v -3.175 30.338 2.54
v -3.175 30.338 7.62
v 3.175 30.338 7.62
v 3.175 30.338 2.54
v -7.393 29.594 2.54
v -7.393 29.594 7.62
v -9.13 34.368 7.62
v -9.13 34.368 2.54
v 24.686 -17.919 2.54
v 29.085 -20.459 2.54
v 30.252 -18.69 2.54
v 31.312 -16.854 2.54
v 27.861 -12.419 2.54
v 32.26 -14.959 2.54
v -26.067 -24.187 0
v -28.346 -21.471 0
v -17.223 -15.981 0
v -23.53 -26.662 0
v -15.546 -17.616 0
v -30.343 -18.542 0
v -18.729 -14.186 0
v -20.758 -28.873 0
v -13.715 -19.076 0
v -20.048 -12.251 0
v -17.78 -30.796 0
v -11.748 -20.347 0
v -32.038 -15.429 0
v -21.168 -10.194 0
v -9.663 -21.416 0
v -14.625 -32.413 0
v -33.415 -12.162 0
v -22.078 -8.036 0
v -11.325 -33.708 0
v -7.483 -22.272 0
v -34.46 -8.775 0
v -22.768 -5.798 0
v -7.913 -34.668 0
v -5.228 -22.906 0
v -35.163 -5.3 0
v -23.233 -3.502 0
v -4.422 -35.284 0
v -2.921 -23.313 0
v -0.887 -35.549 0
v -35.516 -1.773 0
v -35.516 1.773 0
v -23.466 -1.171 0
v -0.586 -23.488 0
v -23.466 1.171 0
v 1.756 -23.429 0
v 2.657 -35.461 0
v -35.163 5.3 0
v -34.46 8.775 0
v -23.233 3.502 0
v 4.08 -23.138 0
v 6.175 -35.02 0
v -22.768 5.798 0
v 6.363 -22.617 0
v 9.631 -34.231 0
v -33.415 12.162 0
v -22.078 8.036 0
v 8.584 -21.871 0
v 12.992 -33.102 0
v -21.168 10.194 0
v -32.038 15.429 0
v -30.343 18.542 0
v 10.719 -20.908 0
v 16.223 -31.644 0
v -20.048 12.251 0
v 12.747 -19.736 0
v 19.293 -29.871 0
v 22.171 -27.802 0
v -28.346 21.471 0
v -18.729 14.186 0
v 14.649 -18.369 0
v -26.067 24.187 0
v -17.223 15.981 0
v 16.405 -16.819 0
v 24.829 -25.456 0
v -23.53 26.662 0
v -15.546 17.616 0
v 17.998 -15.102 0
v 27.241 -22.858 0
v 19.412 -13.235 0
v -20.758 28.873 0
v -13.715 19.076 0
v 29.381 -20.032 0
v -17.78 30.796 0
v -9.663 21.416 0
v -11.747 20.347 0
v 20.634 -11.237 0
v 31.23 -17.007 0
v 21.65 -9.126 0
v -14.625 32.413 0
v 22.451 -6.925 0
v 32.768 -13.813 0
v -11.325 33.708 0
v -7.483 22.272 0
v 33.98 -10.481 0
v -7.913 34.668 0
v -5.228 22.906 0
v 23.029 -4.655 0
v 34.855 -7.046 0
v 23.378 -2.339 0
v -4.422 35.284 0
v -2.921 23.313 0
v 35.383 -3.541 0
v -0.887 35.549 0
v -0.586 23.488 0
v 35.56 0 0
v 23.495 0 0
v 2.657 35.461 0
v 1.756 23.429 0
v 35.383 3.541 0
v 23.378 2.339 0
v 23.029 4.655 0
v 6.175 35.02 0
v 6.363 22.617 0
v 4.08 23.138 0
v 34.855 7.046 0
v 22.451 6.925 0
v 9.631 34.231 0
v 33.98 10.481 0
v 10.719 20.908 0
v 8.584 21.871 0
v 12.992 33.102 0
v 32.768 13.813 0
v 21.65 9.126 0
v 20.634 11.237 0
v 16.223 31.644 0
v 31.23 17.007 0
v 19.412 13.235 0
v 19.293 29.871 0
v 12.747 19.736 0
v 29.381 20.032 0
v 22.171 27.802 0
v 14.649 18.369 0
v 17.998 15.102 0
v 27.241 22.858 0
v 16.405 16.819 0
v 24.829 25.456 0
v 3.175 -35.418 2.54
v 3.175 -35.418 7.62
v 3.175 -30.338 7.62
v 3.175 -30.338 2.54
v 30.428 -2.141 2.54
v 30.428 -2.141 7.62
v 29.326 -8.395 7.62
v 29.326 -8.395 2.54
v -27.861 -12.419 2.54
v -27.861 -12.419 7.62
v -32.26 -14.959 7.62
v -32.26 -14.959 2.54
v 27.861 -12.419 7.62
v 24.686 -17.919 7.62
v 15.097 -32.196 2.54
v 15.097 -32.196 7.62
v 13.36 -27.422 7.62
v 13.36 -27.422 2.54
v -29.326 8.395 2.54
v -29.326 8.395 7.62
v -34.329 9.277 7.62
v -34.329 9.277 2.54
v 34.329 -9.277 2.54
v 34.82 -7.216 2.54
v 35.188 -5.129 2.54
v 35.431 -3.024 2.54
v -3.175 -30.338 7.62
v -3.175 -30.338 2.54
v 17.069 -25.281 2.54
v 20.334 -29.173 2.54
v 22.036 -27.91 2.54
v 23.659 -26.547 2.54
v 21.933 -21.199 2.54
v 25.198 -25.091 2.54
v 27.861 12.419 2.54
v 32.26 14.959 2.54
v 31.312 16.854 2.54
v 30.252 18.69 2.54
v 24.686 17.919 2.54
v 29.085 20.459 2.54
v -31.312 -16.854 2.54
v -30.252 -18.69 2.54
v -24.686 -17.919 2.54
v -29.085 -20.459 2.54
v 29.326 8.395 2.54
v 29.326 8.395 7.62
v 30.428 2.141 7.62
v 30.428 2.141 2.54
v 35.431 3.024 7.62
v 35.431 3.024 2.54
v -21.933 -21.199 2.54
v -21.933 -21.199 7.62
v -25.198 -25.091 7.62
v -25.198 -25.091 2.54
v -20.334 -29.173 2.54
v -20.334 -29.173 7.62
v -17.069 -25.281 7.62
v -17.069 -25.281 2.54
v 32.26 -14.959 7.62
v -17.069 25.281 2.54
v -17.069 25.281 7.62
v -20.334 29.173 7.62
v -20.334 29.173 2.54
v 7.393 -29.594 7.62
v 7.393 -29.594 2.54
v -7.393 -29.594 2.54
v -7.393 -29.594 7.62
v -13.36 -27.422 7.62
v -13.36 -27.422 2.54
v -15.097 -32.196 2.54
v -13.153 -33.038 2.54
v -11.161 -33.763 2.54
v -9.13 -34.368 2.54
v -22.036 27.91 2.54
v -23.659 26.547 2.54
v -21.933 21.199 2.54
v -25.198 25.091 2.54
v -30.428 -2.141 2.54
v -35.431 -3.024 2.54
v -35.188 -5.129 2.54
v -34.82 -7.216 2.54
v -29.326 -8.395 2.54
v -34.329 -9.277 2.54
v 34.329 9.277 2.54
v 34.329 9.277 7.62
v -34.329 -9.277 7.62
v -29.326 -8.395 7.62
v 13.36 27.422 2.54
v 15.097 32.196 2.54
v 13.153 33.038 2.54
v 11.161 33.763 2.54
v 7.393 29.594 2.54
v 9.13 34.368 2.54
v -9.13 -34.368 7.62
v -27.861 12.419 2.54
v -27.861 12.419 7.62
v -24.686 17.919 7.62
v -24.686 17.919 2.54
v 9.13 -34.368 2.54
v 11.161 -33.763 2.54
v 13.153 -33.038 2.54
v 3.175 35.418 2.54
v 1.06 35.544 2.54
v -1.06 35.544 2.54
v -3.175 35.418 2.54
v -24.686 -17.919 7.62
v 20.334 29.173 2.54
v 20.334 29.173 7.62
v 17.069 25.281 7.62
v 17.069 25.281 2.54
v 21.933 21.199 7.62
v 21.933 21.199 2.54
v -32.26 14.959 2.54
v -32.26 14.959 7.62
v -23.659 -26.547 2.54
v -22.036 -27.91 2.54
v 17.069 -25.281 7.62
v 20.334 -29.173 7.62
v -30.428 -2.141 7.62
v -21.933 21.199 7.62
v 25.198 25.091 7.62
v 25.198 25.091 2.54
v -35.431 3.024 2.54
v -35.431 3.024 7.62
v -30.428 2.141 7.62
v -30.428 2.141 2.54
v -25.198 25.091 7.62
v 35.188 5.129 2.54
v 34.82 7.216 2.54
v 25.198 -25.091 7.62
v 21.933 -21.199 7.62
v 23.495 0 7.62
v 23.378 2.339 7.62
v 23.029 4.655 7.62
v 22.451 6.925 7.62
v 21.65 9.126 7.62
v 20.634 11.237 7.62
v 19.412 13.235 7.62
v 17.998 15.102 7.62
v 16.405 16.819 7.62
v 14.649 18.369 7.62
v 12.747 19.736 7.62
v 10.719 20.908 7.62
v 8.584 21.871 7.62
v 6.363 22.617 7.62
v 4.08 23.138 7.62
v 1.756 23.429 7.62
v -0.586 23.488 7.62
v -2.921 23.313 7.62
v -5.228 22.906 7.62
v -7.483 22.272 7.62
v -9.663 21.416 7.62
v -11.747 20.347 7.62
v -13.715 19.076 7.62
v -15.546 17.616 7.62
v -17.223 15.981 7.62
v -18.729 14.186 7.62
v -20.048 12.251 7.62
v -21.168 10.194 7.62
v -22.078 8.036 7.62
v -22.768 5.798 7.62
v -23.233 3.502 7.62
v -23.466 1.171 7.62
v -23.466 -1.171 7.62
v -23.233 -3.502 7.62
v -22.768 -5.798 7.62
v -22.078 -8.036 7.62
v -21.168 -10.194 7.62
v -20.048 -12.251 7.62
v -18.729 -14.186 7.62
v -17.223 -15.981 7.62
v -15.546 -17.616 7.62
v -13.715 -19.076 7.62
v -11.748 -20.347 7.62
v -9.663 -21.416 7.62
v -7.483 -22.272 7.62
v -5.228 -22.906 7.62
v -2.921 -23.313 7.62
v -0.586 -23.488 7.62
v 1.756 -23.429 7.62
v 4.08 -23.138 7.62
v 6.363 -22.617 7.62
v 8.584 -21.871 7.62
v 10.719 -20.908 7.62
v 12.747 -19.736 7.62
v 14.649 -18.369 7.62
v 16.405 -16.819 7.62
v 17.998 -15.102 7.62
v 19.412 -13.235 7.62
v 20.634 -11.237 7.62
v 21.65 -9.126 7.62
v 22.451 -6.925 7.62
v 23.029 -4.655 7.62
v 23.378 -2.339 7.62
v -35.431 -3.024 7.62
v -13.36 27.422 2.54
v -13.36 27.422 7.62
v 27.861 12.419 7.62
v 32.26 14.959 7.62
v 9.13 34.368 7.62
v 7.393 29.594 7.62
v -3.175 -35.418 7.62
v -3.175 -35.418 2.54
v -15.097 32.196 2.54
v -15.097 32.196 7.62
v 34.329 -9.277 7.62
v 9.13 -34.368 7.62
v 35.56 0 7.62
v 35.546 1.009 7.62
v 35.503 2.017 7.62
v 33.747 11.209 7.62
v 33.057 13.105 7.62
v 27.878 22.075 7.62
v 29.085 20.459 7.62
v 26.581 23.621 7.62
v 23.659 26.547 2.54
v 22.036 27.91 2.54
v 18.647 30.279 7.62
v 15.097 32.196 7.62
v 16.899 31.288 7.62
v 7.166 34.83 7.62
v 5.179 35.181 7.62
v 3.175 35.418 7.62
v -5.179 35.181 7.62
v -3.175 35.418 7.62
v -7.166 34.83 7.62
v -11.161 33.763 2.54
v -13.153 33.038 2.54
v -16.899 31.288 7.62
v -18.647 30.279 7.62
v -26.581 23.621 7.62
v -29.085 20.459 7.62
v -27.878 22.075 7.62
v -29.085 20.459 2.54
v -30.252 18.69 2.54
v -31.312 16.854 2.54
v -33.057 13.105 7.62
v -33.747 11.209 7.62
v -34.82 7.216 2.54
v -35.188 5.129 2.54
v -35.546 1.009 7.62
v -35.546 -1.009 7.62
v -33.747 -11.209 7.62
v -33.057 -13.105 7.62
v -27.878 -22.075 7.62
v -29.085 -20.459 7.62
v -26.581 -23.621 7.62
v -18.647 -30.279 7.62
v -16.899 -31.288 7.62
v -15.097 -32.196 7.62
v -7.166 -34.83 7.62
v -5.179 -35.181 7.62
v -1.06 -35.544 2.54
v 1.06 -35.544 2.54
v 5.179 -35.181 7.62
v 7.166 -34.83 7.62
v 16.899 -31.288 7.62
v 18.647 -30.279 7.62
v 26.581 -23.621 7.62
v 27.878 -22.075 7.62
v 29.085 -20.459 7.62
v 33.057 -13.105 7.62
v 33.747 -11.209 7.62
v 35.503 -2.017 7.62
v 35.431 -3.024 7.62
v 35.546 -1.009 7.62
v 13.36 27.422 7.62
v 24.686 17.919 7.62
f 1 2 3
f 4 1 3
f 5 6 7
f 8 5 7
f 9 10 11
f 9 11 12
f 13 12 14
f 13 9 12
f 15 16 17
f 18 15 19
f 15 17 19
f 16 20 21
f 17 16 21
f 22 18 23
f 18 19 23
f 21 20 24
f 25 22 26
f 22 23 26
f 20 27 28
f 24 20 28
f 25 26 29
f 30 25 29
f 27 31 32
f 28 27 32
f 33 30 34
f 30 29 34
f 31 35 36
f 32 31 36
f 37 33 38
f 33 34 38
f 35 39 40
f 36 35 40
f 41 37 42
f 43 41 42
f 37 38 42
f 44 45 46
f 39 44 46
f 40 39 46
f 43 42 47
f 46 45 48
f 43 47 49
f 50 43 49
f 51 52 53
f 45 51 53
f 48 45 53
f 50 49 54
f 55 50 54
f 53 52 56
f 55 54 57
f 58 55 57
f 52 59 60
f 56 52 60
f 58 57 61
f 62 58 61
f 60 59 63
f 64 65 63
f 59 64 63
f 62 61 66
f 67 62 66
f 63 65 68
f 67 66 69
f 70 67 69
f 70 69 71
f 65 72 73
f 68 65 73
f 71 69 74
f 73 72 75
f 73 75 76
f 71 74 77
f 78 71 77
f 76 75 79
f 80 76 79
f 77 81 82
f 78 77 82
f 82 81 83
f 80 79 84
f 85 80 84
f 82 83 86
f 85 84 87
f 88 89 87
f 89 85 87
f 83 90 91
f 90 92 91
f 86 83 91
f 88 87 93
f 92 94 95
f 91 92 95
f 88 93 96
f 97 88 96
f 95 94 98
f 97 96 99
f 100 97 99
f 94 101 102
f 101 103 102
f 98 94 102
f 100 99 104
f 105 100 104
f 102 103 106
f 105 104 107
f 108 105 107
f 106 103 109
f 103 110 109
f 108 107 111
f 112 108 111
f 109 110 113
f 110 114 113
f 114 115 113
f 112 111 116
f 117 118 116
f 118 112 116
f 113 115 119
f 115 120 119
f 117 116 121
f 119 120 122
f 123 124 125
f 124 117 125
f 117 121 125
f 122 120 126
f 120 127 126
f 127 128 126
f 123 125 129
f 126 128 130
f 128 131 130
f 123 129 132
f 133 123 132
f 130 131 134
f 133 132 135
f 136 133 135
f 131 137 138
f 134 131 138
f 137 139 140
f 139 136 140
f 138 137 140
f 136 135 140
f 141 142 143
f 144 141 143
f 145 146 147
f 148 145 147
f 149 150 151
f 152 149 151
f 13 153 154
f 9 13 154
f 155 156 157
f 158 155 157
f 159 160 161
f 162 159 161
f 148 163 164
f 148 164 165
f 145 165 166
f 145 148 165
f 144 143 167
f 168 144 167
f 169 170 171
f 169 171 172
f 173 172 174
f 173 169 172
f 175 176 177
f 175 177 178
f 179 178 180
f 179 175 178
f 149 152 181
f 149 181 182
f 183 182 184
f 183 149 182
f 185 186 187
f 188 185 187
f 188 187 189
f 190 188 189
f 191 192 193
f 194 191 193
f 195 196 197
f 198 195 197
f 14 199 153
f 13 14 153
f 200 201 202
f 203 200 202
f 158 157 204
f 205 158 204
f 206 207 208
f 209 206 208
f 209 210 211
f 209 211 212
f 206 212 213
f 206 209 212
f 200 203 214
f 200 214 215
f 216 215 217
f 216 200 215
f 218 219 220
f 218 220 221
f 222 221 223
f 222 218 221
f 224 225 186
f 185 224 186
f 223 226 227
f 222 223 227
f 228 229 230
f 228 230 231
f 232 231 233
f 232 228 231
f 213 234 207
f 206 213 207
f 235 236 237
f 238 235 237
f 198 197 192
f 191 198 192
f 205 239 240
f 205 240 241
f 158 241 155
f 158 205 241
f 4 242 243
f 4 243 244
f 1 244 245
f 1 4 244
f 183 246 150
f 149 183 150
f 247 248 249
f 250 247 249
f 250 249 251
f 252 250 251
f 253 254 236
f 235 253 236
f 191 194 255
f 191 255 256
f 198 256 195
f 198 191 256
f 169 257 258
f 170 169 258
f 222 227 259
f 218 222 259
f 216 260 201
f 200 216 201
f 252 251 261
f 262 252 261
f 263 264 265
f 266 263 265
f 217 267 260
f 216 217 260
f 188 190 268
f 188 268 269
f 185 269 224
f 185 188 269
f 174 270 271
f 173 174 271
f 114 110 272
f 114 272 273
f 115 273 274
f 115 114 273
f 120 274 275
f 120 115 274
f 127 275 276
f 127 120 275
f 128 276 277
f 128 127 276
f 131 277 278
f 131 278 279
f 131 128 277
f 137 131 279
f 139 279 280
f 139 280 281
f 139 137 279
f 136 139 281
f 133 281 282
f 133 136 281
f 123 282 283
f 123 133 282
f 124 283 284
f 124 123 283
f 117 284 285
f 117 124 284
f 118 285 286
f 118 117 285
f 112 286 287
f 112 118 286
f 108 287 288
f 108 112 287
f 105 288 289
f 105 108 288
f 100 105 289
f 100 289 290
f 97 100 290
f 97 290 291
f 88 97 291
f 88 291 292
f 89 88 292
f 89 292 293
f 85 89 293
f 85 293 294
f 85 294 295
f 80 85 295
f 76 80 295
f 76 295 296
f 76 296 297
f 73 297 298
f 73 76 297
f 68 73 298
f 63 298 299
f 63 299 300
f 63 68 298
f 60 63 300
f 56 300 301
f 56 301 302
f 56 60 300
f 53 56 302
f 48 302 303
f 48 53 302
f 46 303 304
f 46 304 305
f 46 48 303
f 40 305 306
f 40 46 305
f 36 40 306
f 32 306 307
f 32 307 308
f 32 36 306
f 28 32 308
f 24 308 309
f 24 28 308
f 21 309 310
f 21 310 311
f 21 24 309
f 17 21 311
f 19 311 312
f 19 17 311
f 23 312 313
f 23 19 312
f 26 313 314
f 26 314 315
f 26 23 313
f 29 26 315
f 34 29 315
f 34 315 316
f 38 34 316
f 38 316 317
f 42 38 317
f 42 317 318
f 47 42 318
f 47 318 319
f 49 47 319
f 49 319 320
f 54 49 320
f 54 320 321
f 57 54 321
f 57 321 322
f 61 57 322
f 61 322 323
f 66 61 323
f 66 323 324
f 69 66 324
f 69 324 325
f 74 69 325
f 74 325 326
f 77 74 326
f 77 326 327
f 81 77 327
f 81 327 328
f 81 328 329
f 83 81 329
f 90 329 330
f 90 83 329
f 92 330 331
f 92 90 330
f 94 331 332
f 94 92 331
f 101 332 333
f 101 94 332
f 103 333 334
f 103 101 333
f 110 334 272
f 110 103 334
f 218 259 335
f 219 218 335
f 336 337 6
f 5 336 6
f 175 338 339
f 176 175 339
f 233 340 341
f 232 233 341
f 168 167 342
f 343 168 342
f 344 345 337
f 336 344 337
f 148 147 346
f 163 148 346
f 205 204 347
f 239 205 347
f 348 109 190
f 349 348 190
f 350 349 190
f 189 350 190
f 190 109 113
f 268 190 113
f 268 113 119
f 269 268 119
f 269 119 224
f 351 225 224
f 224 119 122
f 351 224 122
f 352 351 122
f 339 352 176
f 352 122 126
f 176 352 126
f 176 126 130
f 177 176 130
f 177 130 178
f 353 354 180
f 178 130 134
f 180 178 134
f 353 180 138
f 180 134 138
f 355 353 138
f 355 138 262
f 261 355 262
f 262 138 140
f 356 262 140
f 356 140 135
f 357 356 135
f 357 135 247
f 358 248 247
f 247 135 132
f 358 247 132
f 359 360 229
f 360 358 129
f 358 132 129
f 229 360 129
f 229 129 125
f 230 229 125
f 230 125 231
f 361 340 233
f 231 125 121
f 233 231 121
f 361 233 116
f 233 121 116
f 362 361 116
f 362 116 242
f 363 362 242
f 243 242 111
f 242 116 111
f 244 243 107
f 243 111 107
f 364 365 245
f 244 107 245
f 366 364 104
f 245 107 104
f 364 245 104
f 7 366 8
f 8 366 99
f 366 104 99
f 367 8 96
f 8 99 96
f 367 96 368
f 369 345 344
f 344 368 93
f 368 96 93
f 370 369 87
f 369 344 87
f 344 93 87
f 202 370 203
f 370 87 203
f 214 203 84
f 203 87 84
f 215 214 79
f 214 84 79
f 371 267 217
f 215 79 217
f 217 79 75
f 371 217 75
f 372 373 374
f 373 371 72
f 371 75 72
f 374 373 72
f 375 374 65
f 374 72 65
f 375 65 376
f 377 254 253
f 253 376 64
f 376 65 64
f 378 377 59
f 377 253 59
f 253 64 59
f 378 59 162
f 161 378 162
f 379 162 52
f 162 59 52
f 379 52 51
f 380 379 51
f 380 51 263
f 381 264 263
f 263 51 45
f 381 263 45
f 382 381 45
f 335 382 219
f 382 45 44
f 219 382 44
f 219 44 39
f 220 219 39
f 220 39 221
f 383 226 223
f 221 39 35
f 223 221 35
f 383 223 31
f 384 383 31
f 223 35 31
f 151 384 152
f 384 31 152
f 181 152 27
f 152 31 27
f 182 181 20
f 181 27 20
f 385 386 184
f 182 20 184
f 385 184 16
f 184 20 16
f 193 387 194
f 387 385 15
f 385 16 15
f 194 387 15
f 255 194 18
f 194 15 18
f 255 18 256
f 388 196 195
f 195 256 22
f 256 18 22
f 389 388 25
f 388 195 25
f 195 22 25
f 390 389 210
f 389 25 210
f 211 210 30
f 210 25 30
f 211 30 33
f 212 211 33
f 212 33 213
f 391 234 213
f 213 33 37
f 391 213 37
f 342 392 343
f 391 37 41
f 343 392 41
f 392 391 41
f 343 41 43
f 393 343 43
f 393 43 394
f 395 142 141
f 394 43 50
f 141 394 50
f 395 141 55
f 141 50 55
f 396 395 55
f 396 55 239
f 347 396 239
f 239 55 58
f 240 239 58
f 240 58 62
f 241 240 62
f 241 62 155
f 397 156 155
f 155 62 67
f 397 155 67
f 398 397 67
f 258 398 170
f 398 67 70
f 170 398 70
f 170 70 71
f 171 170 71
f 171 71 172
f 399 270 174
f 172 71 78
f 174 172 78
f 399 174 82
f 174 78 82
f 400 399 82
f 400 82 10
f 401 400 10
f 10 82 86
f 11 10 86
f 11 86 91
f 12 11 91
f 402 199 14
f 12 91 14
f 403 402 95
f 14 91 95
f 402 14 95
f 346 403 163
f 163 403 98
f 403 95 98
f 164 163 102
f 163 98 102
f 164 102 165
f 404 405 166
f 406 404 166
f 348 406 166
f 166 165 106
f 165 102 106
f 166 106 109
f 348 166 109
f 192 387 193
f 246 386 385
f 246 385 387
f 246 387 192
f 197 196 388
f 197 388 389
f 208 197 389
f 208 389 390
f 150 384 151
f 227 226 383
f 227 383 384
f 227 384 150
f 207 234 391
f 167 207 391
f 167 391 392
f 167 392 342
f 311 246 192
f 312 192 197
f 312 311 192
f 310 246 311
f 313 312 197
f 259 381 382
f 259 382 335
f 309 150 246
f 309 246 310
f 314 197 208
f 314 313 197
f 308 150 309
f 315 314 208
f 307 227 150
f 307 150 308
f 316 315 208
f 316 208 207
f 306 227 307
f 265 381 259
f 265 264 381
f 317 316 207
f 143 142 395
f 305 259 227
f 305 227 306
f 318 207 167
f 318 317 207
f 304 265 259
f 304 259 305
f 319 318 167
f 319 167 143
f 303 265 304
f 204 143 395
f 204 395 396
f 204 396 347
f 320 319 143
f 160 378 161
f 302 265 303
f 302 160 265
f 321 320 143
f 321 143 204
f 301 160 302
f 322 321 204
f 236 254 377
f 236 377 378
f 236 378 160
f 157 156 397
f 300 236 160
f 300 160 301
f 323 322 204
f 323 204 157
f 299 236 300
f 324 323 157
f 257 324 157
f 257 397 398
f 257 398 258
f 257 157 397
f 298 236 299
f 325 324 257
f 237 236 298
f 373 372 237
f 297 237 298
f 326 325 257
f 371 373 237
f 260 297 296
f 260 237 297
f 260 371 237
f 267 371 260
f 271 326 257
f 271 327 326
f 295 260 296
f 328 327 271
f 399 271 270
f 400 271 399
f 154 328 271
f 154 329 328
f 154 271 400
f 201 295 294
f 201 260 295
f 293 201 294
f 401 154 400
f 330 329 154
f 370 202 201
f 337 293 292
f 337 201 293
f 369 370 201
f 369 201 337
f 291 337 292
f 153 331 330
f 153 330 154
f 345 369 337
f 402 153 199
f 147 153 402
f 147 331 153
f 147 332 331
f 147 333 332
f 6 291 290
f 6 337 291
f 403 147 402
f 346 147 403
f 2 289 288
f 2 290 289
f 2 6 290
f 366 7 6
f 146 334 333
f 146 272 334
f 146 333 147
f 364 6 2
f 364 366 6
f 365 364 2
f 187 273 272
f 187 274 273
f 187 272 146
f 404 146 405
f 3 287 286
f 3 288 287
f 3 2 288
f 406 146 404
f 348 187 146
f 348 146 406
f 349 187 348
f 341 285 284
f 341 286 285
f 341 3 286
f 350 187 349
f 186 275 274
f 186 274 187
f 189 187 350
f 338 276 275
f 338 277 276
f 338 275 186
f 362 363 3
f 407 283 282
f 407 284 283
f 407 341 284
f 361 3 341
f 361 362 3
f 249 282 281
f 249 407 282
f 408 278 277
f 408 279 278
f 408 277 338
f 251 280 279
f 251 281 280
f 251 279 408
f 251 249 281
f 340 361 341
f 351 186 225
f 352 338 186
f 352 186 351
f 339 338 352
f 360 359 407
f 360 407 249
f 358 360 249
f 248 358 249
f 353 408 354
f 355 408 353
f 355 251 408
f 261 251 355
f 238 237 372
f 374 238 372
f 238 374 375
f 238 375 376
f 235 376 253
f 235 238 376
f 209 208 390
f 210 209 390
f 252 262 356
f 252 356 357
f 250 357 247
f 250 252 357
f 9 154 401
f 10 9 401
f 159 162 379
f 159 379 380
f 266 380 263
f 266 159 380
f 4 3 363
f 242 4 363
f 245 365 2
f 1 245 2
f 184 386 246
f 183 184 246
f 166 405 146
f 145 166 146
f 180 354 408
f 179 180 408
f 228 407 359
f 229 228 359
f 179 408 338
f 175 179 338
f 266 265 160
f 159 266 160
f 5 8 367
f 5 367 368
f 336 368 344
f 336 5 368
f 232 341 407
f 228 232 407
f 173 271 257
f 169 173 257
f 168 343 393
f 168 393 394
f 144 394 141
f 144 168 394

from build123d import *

# Parameters (mm, degrees)
F0_R            = 35.56
F0_R_2          = 23.495
F1_DEPTH        = 7.62
F3_DEPTH        = 5.08
F3_COPIES_COUNT = 18


# Not quite as in the source:
# - a pattern or mirror of a feature is missing from the dataset's text; its kind, count and spacing are read off the source's solid


with BuildPart() as f1:
    # F0 (on Top) → F1 (new body)
    with BuildSketch(Plane.XY):
        Circle(F0_R)
        Circle(F0_R_2, mode=Mode.SUBTRACT)
    extrude(amount=F1_DEPTH)

    # F2 (on face) → F3 (cut)
    with BuildSketch(Plane.XY.offset(7.62)):
        with BuildLine():
            Line((-3.175, -30.3379753092), (-3.175, -35.4179753092))
            ThreePointArc((-3.175, -35.4179753092), (0, -35.56), (3.175, -35.4179753092))
            Line((3.175, -35.4179753092), (3.175, -30.3379753092))
            Line((3.175, -30.3379753092), (-3.175, -30.3379753092))
        make_face()
    f3 = extrude(amount=-F3_DEPTH, mode=Mode.SUBTRACT)

    # F3_copies: F3 ×18 about axis
    f3_copies_axis = Axis((0, 0, 0), (0, 0, 1))
    for i in range(1, F3_COPIES_COUNT):
        add(f3.rotate(f3_copies_axis, i * 360 / F3_COPIES_COUNT), mode=Mode.SUBTRACT)


solid = f1.part
